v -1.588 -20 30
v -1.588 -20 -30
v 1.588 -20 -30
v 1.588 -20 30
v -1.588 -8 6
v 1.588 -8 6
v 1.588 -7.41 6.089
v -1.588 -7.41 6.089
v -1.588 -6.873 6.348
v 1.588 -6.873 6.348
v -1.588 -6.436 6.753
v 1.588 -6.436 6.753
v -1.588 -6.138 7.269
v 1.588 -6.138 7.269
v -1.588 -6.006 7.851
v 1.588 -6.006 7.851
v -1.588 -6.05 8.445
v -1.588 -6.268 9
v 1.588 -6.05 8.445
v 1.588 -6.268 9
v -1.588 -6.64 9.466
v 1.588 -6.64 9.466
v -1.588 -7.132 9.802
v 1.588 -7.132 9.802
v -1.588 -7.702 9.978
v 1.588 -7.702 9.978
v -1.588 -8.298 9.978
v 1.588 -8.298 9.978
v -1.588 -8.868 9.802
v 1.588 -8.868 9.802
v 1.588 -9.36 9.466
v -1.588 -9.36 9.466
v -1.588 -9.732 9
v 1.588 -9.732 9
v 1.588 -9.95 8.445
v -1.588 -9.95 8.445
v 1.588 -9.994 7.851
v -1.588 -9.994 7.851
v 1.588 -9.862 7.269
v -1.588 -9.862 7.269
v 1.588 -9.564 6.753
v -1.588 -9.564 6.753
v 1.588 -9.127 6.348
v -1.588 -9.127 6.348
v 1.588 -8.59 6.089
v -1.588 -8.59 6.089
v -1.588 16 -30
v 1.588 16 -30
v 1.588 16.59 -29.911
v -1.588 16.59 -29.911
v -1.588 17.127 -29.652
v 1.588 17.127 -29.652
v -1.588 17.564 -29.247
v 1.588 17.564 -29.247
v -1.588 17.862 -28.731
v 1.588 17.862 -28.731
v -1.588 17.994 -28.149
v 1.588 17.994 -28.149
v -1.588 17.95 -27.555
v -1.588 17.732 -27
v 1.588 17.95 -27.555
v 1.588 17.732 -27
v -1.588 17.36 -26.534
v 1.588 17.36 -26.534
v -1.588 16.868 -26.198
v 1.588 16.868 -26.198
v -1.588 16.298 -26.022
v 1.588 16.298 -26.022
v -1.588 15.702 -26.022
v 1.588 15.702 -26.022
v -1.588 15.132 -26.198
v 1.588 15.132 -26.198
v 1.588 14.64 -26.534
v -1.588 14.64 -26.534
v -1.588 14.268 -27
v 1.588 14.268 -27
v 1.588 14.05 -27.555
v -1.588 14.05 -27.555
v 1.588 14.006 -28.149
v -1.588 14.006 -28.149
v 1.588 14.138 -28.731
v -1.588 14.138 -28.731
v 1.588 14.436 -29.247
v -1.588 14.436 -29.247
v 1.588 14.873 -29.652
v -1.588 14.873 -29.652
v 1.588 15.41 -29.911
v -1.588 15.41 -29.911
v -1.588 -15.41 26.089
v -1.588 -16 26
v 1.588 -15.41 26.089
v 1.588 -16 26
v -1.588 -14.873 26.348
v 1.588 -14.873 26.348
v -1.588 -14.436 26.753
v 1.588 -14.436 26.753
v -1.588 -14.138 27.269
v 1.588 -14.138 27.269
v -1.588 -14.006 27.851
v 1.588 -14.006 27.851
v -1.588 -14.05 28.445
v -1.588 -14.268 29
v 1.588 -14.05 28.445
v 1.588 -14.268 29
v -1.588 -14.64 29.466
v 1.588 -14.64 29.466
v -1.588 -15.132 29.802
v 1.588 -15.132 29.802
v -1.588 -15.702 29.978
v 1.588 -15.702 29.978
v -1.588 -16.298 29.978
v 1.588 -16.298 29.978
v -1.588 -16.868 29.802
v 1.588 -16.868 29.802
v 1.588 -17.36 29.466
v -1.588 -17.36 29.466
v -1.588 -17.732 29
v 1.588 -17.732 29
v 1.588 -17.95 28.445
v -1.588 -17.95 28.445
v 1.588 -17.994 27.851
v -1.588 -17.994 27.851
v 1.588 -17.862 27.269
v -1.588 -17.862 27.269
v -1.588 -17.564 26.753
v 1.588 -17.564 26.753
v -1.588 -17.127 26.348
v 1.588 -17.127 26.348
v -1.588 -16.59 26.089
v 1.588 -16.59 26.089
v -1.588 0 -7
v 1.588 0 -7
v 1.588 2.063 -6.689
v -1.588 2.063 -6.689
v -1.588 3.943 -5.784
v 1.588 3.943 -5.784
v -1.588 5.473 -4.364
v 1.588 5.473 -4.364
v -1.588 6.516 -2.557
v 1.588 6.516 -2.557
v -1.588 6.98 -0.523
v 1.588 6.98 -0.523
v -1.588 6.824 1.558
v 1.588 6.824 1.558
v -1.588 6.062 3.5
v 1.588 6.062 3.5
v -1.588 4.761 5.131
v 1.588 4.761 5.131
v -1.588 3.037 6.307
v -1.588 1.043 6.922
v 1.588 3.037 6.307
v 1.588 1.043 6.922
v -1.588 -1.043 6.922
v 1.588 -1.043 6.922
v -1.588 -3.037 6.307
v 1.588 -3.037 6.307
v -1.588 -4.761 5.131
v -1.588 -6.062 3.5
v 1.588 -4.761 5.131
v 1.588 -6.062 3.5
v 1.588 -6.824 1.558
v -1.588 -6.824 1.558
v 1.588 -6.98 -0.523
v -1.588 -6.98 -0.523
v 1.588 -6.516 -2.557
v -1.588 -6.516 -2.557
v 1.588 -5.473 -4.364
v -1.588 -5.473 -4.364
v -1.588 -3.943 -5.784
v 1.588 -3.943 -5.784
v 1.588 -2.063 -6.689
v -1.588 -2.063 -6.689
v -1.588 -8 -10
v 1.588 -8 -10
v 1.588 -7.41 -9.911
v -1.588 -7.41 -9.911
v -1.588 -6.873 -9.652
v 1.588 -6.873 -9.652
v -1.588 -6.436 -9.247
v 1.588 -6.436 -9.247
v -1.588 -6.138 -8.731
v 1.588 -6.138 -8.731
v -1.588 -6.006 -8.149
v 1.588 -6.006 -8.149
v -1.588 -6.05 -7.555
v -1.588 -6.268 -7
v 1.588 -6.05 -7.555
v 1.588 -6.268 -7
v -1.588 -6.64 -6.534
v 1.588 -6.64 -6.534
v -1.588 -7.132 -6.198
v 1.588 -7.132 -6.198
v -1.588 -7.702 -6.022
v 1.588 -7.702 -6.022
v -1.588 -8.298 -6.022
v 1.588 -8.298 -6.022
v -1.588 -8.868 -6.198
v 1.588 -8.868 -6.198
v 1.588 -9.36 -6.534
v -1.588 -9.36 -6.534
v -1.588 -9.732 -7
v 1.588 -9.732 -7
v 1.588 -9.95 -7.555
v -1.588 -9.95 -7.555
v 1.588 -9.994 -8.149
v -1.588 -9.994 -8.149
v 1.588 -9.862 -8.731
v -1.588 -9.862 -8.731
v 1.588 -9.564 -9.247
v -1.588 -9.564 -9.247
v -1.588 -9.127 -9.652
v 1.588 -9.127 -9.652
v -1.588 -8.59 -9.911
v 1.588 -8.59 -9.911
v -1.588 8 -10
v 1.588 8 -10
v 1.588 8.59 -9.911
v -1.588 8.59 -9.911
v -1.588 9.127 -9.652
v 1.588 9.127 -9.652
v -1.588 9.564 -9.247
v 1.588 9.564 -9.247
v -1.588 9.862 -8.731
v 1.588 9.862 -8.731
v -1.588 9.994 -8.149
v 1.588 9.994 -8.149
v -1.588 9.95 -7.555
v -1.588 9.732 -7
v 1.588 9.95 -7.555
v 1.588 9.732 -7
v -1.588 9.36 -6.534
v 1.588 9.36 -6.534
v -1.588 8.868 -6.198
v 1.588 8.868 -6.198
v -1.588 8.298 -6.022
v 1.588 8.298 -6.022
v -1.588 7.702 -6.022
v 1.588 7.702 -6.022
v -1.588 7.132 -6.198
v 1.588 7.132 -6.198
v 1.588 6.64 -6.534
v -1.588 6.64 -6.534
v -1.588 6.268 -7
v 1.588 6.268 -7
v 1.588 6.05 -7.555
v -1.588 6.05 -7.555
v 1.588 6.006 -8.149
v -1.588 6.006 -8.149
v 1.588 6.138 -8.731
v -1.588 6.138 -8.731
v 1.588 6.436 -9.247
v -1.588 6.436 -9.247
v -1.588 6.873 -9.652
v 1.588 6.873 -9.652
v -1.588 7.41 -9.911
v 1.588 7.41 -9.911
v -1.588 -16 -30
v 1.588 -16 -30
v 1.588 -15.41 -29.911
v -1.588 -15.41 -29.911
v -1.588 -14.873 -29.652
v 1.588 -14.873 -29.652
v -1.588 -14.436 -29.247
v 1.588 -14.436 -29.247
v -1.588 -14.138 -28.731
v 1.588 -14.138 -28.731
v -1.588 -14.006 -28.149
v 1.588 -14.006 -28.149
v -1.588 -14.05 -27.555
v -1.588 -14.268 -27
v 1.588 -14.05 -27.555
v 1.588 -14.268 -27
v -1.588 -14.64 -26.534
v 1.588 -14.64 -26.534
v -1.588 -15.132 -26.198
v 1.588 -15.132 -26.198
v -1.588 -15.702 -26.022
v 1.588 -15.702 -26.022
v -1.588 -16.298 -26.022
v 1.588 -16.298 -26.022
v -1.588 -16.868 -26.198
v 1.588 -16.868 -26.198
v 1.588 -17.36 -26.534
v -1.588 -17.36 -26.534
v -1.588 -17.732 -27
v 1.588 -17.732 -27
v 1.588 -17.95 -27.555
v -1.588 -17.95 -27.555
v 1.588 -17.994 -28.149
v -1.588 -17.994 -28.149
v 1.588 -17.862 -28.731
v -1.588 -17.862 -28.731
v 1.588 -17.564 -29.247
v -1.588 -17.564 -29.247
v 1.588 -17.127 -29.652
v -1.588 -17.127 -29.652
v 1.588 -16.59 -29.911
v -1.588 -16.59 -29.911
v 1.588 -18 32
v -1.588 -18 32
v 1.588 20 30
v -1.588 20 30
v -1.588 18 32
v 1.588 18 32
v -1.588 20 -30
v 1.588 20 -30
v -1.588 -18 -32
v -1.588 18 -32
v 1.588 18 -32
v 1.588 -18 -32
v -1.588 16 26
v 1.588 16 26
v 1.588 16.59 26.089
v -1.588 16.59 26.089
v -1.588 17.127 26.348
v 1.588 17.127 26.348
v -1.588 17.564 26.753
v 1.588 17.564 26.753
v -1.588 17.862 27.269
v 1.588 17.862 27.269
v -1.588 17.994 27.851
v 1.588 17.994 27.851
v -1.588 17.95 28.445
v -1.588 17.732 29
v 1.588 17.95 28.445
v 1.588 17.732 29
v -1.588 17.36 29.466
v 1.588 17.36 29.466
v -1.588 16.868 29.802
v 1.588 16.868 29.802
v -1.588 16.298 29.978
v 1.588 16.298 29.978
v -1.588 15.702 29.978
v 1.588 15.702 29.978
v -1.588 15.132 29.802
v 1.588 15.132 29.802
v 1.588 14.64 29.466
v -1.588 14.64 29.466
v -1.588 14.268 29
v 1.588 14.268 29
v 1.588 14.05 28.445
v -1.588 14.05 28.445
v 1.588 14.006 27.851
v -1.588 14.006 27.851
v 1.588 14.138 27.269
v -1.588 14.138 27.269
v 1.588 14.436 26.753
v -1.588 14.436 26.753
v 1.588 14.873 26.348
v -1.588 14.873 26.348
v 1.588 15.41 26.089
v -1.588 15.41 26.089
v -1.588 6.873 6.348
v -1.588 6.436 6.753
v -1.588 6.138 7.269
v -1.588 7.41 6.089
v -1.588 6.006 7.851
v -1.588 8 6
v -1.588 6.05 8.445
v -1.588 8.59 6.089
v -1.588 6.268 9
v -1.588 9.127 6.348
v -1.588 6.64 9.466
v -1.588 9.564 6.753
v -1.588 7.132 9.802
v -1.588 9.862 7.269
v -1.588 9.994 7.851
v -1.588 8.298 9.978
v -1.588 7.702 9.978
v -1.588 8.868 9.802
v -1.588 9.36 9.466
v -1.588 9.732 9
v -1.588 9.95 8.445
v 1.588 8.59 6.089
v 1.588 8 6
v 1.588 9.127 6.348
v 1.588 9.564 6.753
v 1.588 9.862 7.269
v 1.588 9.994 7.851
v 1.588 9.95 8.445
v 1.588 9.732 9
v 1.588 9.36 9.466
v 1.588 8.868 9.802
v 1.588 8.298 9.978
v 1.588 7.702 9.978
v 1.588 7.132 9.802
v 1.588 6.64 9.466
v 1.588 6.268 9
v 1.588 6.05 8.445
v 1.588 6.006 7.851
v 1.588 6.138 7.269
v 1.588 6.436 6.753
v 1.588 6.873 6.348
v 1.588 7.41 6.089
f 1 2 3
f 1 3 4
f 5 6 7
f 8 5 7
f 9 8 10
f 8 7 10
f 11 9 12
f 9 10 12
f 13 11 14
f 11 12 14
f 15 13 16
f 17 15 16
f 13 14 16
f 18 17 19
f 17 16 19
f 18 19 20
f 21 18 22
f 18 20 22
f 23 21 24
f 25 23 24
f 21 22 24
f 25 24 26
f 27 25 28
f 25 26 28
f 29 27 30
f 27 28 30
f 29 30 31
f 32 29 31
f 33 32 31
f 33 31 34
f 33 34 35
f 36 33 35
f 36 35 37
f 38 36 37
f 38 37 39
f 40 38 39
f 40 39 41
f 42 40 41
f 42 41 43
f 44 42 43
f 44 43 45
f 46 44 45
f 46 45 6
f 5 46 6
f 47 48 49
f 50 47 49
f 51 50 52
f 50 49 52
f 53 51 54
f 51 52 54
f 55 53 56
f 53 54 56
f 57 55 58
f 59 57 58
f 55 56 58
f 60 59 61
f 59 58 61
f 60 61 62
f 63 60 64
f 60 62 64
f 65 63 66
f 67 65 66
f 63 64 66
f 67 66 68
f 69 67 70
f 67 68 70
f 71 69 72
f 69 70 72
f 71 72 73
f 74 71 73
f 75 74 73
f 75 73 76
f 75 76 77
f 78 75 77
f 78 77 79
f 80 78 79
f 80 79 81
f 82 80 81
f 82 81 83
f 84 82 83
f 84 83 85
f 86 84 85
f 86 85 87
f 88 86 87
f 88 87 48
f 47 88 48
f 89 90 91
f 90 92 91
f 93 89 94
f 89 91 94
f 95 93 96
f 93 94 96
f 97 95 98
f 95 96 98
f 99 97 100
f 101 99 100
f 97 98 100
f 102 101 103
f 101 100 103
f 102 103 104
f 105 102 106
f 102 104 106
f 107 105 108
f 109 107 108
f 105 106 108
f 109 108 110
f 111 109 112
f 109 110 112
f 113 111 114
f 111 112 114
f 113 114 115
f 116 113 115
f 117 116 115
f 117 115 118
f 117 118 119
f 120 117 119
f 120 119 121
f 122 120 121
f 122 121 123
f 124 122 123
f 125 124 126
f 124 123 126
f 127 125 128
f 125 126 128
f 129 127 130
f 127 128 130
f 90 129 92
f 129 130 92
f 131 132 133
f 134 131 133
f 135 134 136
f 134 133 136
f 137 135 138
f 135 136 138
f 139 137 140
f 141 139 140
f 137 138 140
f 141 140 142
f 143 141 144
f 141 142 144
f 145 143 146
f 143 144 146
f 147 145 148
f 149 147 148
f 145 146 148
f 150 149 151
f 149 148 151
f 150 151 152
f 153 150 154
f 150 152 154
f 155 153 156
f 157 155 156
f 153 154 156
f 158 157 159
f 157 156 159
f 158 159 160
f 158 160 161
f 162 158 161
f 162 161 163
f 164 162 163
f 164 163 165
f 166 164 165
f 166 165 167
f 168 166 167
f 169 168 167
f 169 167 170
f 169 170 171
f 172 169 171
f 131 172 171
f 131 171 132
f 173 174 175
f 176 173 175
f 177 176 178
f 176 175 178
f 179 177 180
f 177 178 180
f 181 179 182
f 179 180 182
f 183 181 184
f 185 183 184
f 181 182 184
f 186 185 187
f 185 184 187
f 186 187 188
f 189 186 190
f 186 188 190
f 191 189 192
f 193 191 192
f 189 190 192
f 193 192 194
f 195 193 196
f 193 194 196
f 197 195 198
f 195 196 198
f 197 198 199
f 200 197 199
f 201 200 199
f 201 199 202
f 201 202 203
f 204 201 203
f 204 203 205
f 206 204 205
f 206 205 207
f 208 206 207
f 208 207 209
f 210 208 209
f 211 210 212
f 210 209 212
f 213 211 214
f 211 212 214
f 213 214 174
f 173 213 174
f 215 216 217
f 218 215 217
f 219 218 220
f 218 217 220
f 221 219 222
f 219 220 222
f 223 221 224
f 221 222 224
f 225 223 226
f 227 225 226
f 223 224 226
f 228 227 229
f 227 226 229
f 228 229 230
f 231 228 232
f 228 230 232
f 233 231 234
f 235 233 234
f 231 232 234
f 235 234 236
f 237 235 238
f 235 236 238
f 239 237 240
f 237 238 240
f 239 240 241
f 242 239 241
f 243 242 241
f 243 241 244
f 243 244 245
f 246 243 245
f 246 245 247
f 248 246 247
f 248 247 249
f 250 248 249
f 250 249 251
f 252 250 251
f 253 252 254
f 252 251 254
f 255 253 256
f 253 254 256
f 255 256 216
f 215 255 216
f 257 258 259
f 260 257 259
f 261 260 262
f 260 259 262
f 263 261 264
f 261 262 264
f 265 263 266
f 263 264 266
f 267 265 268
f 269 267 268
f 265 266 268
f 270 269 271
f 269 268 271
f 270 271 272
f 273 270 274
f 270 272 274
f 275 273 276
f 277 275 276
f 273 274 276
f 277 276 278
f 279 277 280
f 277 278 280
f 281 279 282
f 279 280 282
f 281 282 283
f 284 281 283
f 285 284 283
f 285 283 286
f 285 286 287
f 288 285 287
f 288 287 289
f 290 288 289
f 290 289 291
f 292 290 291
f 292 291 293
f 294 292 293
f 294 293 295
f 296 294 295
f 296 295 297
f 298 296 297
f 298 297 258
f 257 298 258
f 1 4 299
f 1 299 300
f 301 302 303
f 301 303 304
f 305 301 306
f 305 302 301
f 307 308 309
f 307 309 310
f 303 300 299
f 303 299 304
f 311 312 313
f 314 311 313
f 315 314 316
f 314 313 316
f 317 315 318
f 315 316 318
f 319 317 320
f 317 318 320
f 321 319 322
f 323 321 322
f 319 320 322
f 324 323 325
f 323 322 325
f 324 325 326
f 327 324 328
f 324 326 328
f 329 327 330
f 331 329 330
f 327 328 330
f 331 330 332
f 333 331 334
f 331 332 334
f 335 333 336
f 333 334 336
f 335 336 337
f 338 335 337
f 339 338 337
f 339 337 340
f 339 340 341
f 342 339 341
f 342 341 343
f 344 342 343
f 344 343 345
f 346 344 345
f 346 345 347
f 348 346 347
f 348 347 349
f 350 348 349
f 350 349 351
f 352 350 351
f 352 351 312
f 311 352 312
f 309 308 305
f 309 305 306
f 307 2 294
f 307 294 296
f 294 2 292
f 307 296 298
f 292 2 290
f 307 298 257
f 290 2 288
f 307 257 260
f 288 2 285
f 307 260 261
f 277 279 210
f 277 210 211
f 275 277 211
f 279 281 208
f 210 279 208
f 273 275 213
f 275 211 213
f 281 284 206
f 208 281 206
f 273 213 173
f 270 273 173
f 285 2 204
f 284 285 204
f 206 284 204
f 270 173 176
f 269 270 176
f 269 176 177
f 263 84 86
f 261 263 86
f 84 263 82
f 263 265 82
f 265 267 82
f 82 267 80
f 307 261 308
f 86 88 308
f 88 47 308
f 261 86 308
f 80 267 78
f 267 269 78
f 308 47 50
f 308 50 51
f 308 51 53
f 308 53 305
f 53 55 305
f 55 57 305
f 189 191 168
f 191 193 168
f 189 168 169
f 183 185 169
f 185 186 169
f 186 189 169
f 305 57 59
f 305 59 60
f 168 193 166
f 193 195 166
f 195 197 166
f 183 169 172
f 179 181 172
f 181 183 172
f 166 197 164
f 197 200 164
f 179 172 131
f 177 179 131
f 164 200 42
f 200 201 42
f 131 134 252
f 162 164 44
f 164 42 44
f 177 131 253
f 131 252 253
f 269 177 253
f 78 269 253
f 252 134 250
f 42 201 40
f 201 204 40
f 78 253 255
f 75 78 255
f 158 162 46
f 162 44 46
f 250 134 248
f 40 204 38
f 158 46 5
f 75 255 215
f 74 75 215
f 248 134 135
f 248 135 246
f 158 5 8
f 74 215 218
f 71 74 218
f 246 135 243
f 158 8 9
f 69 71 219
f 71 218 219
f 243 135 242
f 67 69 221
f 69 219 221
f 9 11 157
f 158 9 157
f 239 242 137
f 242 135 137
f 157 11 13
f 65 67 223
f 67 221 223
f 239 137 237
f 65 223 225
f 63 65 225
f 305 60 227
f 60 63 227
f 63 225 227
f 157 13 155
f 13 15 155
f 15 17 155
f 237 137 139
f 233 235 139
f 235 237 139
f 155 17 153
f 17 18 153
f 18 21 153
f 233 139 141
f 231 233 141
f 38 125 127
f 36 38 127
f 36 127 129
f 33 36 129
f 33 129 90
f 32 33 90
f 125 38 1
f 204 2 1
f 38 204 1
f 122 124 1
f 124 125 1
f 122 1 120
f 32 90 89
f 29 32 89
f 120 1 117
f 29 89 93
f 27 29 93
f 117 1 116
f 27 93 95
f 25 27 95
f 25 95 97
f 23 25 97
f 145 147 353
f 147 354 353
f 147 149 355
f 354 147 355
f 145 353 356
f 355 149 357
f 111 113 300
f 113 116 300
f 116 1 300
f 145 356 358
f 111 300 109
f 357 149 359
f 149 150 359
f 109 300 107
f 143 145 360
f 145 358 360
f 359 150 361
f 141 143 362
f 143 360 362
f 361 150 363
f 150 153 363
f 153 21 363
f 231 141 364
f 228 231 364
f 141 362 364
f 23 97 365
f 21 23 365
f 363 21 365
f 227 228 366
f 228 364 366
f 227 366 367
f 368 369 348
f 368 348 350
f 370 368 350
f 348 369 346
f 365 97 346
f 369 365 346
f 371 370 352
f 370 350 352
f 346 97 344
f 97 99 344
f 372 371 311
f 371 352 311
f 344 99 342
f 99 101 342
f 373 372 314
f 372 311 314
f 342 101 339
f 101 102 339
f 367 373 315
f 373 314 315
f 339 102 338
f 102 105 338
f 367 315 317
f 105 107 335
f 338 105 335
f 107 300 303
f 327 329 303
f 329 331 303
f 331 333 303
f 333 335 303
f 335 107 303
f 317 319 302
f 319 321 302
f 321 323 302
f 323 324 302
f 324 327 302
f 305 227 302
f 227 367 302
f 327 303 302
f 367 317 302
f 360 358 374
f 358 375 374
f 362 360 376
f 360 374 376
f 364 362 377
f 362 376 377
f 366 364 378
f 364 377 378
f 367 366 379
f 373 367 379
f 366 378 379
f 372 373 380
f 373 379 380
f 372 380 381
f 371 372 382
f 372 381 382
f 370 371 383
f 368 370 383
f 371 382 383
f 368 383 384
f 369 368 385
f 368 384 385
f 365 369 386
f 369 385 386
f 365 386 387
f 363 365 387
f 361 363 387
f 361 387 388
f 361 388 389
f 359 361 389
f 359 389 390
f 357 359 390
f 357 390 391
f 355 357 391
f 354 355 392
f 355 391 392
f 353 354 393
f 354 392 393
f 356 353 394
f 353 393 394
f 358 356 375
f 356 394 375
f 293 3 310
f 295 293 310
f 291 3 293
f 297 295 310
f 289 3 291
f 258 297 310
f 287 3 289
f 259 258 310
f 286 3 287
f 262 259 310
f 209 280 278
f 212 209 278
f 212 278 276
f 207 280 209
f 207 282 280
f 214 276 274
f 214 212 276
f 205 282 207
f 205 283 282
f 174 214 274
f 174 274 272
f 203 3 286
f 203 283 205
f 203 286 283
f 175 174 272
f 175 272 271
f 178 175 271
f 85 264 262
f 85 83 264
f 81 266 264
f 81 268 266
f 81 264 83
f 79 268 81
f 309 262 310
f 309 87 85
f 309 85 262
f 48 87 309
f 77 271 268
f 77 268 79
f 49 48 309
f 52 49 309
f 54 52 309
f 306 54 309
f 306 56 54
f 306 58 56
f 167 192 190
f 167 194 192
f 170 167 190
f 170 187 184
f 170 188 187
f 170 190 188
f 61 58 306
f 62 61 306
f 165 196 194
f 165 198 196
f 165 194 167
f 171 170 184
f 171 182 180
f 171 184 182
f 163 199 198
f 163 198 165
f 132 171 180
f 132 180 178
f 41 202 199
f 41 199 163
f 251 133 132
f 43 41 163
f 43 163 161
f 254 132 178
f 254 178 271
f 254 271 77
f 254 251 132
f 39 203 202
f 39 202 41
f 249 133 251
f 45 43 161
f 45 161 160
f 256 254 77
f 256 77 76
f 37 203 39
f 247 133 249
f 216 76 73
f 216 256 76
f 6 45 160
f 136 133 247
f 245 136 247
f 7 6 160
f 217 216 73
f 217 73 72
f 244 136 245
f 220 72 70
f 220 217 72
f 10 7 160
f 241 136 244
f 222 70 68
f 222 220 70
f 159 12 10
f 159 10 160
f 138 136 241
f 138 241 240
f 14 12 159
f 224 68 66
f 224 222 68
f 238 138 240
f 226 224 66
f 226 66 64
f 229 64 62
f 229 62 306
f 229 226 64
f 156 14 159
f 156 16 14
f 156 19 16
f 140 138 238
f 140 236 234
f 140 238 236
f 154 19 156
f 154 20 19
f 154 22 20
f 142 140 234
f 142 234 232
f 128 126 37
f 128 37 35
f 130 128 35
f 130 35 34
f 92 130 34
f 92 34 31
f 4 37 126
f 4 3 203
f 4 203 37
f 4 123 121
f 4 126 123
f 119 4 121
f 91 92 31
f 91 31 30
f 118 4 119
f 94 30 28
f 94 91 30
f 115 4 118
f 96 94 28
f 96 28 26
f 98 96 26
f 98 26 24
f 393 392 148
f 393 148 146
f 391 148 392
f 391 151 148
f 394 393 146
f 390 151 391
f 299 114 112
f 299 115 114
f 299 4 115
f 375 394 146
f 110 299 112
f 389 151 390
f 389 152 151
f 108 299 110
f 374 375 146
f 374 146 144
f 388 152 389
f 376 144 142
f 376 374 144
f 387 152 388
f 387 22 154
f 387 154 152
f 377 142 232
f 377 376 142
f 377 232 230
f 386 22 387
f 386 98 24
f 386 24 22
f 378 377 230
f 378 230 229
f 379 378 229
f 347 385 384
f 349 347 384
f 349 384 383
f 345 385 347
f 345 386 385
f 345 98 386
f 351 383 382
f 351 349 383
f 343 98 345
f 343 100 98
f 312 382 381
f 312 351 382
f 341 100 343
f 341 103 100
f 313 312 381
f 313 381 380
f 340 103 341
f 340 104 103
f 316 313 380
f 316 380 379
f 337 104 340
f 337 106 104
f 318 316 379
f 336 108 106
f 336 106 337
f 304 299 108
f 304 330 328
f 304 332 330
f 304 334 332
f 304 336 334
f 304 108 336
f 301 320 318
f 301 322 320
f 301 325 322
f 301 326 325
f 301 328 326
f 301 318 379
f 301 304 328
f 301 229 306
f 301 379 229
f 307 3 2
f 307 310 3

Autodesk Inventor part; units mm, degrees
ref_plane "YZ Plane" through (0, 0, 0) normal (1, 0, 0) x (0, 1, 0)
ref_plane "XZ Plane" through (0, 0, 0) normal (0, 1, 0) x (-1, 0, 0)
ref_plane "XY Plane" through (0, 0, 0) normal (0, 0, 1) x (1, 0, 0)
sketch "Sketch1" plane through (0, 0, 0) normal (1, 0, 0) x (0, 1, 0)
  line L0 (-20, 32) -> (20, 32)
  line L1 (20, 32) -> (20, -32)
  line L2 (20, -32) -> (-20, -32)
  line L3 (-20, -32) -> (-20, 32)
  line L4 (-20, 32) -> (20, -32) construction
  line L5 (20, 32) -> (-20, -32) construction
  point P0 (0, 0)
  dimension "d0" = 40
  dimension "d1" = 64
extrude "Extrusion1" add sketch "Sketch1" along normal mid plane 3.175
sketch "Sketch2" plane through (1.5875, 0, 0) normal (1, 0, 0) x (0, 0, -1)
  circle A0 centre (-28, 16) radius 2
  line L0 (-32, 20) -> (-32, -20) construction
  line L1 (-32, 0) -> (32, 0) construction
  line L2 (32, -20) -> (32, 20) construction
  line L3 (32, 20) -> (-32, 20) construction
  line L4 (0, 20) -> (0, -20) construction
  circle A1 centre (28, 16) radius 2
  circle A2 centre (-28, -16) radius 2
  circle A3 centre (28, -16) radius 2
  circle A4 centre (-8, 8) radius 2
  circle A5 centre (-8, -8) radius 2
  circle A6 centre (8, -8) radius 2
  circle A7 centre (8, 8) radius 2
  circle A8 centre (0, 0) radius 7
  point P0 (0, 0)
  point P1 (0, 0)
  dimension "d4" = 4
  dimension "d5" = 28
  dimension "d6" = 16
  dimension "d7" = 4
  dimension "d8" = 8
  dimension "d9" = 8
  dimension "d12" = 360
  dimension "d14" = 14
extrude "Extrusion2" cut sketch "Sketch2" against normal through all
chamfer "Chamfer1" distance 2 angle 45 4 edges at (0, 20, 32) (0, -20, 32) (0, -20, -32) (0, 20, -32)
properties part number "TurretMotorPlate"
